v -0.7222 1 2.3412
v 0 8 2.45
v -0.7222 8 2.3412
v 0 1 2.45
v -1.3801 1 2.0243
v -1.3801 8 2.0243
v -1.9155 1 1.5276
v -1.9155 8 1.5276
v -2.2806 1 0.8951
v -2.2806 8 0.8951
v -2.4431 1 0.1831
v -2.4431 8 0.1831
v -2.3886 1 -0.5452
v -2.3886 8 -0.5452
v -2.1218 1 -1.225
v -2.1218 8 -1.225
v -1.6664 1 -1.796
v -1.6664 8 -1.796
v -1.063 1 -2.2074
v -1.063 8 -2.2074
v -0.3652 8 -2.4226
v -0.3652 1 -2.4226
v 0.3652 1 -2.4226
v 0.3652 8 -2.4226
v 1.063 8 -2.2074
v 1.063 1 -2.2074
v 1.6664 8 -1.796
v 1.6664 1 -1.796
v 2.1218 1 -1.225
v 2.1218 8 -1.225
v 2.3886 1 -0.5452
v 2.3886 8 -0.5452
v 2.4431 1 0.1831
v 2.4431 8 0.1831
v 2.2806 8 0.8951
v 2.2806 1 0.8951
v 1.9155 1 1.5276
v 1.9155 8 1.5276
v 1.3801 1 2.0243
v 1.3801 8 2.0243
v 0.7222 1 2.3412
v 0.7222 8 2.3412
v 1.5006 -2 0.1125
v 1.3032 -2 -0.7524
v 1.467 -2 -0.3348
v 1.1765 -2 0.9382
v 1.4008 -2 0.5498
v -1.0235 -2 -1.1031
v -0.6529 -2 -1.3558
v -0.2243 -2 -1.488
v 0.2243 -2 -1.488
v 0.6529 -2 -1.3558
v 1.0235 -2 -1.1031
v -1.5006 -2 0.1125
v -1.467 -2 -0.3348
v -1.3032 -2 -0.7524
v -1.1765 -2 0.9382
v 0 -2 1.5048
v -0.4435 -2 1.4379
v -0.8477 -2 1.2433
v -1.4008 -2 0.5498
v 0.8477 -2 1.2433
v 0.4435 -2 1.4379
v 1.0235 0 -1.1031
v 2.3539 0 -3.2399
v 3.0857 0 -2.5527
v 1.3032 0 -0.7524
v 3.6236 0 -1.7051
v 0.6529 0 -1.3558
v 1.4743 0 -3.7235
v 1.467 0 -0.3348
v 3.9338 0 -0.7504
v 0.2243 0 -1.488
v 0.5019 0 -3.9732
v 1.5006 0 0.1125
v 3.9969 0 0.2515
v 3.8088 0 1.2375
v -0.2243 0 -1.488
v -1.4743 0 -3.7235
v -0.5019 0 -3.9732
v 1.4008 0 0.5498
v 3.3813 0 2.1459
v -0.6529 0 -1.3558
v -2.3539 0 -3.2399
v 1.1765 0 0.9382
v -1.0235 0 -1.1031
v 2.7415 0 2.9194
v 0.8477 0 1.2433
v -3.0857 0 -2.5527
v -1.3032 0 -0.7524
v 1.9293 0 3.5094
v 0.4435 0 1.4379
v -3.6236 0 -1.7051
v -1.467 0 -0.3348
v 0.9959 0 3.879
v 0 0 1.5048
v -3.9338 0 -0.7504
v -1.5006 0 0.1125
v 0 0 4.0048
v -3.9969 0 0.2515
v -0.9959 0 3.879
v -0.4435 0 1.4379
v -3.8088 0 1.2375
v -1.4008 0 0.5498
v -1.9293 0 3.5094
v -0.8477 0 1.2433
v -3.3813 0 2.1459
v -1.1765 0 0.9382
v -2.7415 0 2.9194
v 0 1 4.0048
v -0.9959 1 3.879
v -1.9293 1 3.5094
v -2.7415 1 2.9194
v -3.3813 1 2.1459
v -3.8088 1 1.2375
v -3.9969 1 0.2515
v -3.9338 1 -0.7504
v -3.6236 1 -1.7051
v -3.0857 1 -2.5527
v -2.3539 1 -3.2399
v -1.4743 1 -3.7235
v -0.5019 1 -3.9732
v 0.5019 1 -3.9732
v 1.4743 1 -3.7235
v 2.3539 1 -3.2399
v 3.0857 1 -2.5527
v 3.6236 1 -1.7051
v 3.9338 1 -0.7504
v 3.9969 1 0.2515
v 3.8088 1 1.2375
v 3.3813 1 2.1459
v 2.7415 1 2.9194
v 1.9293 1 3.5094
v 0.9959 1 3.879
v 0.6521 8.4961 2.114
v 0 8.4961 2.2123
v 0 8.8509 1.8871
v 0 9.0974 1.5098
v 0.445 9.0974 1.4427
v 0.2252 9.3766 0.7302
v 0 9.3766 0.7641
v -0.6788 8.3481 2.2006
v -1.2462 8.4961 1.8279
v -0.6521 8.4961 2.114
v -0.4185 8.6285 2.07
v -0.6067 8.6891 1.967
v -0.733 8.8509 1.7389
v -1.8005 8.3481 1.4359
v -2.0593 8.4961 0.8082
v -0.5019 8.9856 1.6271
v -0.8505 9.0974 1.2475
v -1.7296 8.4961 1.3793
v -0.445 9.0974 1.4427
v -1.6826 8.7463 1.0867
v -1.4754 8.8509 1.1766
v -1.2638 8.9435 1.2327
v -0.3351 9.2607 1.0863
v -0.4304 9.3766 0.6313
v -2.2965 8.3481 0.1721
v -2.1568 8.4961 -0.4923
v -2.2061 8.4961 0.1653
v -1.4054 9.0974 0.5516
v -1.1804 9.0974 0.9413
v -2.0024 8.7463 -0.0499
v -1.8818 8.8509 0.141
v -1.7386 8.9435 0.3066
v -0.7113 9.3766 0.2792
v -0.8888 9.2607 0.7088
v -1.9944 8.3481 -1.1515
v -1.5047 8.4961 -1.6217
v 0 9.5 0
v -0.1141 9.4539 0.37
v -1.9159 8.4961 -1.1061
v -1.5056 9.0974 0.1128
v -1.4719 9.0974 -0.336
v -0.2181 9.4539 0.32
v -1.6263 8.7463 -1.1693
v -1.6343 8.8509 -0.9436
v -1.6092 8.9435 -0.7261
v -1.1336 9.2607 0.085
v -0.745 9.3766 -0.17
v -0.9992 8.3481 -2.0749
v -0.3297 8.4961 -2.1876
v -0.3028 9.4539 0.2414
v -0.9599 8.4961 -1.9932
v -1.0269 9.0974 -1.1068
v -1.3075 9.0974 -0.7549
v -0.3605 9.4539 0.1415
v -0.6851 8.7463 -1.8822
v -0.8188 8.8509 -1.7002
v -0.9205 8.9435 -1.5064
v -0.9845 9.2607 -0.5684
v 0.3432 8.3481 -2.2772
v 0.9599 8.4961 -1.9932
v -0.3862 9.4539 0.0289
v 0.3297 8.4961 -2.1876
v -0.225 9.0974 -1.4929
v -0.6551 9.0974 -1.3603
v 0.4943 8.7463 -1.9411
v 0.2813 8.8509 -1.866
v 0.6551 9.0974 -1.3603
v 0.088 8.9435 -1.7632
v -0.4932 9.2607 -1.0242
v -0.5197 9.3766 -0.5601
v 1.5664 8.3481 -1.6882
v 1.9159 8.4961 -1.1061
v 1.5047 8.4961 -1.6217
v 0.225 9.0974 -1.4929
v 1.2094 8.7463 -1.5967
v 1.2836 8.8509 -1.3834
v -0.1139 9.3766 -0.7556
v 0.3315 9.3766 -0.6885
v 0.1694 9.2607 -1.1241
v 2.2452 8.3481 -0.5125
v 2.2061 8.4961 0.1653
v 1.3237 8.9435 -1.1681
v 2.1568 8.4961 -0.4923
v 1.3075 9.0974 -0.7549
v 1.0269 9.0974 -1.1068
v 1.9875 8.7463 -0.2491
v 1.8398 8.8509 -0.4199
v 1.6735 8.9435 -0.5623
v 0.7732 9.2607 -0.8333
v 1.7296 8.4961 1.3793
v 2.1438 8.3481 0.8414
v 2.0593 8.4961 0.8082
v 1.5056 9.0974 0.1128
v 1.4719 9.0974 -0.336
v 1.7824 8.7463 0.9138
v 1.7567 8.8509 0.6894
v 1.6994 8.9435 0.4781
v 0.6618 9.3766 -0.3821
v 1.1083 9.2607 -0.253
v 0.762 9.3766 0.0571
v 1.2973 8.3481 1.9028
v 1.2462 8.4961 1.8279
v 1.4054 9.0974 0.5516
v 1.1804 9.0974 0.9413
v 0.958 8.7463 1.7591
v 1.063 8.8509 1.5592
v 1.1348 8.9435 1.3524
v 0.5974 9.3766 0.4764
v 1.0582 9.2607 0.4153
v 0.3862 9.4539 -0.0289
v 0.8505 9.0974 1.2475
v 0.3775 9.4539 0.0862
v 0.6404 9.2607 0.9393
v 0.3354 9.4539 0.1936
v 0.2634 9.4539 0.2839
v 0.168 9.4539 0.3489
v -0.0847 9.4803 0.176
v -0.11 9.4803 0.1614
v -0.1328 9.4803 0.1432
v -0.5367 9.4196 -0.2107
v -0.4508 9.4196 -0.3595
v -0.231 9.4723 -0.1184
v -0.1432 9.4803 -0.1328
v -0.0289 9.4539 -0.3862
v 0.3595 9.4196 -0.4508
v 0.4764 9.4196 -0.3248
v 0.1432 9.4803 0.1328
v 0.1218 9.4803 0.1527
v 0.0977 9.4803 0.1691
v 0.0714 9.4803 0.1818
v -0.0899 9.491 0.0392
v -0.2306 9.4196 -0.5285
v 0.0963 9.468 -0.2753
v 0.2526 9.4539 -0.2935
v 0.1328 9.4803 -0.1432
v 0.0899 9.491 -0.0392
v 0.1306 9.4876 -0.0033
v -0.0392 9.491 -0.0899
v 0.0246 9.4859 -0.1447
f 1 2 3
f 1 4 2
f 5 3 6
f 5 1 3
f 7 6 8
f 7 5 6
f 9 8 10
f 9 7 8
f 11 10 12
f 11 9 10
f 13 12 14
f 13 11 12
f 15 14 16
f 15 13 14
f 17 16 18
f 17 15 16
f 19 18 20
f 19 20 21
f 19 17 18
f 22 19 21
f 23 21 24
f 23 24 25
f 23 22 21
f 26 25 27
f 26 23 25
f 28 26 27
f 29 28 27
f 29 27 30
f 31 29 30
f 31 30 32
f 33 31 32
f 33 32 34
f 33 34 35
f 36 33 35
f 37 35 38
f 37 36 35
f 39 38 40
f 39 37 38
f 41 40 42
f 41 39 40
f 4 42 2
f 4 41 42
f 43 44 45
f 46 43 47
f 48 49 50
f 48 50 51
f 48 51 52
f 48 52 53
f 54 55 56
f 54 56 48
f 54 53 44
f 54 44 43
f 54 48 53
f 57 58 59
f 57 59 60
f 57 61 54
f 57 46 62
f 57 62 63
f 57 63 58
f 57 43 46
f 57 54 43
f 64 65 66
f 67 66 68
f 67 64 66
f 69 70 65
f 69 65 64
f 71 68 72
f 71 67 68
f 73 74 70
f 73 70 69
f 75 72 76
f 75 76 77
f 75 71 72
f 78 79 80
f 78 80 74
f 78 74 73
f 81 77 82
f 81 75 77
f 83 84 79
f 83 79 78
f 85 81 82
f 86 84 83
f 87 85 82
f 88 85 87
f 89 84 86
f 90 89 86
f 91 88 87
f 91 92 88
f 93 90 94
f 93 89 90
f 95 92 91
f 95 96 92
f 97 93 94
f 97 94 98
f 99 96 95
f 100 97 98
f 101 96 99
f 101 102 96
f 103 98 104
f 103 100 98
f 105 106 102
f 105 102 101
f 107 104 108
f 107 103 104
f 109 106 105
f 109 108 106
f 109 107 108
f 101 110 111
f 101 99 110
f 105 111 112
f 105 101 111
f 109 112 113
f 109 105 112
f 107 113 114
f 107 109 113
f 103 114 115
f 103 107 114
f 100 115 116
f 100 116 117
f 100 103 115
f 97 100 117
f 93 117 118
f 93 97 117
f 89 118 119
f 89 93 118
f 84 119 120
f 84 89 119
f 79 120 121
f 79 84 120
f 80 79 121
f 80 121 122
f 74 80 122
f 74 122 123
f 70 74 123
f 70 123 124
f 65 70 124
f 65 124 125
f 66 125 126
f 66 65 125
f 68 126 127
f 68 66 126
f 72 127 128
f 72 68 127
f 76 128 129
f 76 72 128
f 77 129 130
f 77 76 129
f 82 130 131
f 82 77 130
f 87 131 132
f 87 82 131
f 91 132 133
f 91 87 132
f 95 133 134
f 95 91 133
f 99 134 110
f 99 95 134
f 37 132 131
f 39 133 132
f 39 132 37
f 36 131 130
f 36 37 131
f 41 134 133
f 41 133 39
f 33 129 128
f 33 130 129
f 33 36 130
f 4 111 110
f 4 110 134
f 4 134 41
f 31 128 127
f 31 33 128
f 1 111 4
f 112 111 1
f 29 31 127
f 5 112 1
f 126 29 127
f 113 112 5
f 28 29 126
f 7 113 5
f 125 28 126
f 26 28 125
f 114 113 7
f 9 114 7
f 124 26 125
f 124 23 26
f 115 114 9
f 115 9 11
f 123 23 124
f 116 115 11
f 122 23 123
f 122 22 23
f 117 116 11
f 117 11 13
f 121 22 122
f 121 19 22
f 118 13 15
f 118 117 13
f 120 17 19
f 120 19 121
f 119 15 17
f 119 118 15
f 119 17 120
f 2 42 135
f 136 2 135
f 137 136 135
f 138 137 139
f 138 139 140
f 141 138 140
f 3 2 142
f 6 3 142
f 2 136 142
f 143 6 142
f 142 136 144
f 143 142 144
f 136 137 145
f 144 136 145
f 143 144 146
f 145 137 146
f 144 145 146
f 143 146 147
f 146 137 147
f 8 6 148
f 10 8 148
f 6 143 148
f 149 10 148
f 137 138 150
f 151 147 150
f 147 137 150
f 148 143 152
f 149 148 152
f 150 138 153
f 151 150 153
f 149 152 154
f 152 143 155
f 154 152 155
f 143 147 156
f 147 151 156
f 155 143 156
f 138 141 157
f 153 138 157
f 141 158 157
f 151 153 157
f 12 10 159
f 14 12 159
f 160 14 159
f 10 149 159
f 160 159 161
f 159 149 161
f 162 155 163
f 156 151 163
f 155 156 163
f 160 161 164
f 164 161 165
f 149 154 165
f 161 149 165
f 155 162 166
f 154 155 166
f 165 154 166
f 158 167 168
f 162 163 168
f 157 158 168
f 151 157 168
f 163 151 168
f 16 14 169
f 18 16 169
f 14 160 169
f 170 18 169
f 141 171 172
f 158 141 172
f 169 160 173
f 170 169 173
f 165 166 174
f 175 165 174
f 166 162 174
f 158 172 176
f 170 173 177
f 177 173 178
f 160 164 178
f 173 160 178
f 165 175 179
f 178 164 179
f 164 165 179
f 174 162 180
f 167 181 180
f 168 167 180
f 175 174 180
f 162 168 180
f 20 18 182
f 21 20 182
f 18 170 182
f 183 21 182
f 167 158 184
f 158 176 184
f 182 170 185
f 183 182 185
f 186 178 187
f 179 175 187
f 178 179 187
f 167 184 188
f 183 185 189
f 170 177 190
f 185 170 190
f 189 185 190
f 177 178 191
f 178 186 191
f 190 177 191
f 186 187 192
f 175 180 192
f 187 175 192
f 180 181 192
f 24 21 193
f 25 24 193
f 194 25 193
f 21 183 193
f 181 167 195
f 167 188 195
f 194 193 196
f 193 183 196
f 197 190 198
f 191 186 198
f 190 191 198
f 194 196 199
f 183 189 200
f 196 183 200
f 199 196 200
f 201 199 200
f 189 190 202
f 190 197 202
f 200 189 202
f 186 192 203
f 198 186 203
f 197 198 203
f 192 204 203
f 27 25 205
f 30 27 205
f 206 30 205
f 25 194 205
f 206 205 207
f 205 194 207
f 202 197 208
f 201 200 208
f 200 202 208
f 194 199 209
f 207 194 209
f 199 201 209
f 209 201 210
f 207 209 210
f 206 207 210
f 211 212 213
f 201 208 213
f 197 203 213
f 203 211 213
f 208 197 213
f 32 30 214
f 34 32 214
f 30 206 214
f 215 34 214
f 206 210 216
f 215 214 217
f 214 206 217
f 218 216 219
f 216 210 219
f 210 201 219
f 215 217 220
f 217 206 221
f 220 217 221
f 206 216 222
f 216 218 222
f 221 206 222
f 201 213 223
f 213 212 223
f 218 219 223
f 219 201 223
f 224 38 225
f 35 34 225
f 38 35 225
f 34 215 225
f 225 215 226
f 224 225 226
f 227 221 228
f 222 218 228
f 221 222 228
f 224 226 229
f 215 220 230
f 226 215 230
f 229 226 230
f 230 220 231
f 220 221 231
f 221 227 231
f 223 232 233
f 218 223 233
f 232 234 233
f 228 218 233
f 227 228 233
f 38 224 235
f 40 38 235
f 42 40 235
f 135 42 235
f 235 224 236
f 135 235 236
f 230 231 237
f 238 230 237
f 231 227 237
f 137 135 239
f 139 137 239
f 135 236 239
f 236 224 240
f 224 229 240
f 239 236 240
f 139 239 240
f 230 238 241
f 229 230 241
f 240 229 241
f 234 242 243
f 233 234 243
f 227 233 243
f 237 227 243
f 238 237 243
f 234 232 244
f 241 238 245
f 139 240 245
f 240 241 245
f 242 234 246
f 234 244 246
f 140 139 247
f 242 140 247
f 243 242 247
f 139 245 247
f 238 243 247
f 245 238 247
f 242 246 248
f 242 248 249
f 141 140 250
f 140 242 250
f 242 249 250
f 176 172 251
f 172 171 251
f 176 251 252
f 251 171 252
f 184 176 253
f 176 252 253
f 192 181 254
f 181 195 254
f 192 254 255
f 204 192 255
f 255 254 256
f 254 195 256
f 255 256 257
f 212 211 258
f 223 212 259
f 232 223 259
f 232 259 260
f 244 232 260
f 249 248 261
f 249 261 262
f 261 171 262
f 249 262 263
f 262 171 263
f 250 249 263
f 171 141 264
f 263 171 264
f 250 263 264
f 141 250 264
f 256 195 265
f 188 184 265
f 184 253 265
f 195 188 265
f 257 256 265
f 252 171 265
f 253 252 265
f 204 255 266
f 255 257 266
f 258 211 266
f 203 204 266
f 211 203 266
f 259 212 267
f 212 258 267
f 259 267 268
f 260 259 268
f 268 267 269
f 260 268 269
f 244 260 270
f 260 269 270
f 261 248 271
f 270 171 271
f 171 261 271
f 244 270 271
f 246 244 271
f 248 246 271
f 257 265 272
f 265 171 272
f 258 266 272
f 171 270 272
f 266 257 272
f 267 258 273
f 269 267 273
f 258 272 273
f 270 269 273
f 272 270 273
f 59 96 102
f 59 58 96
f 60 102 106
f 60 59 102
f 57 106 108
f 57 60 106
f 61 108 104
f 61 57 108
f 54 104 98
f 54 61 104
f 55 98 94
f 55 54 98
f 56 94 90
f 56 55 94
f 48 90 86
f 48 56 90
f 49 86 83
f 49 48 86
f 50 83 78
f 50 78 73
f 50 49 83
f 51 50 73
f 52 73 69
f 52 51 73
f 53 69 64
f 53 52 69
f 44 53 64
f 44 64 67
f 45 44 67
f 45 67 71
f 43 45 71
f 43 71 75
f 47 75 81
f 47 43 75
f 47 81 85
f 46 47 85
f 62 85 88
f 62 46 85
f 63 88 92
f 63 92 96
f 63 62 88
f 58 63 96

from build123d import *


with BuildPart() as f1:
    # F0 (on Right) → F1 (revolve)
    with BuildSketch(Plane.YZ):
        with BuildLine():
            Line((-2, 1.504770412), (-2, 0))
            Line((-2, 0), (9.5, 0))
            add(Edge.make_bspline(
                [(8, 2.45), (8.6955977604, 2.2305608727), (9.2895837523, 1.318056569), (9.4629809577, 0.4408934937), (9.5, 0)],
                knots=[0, 0, 0, 0, 0.532645082, 1, 1, 1, 1], degree=3))
            Line((8, 2.45), (1, 2.45))
            Line((1, 2.45), (1, 4.004770412))
            Line((1, 4.004770412), (0, 4.004770412))
            Line((0, 4.004770412), (0, 1.504770412))
            Line((0, 1.504770412), (-2, 1.504770412))
        make_face()
    revolve(axis=Axis((0, 3.75, 0), (0, -1, 0)))


solid = f1.part
